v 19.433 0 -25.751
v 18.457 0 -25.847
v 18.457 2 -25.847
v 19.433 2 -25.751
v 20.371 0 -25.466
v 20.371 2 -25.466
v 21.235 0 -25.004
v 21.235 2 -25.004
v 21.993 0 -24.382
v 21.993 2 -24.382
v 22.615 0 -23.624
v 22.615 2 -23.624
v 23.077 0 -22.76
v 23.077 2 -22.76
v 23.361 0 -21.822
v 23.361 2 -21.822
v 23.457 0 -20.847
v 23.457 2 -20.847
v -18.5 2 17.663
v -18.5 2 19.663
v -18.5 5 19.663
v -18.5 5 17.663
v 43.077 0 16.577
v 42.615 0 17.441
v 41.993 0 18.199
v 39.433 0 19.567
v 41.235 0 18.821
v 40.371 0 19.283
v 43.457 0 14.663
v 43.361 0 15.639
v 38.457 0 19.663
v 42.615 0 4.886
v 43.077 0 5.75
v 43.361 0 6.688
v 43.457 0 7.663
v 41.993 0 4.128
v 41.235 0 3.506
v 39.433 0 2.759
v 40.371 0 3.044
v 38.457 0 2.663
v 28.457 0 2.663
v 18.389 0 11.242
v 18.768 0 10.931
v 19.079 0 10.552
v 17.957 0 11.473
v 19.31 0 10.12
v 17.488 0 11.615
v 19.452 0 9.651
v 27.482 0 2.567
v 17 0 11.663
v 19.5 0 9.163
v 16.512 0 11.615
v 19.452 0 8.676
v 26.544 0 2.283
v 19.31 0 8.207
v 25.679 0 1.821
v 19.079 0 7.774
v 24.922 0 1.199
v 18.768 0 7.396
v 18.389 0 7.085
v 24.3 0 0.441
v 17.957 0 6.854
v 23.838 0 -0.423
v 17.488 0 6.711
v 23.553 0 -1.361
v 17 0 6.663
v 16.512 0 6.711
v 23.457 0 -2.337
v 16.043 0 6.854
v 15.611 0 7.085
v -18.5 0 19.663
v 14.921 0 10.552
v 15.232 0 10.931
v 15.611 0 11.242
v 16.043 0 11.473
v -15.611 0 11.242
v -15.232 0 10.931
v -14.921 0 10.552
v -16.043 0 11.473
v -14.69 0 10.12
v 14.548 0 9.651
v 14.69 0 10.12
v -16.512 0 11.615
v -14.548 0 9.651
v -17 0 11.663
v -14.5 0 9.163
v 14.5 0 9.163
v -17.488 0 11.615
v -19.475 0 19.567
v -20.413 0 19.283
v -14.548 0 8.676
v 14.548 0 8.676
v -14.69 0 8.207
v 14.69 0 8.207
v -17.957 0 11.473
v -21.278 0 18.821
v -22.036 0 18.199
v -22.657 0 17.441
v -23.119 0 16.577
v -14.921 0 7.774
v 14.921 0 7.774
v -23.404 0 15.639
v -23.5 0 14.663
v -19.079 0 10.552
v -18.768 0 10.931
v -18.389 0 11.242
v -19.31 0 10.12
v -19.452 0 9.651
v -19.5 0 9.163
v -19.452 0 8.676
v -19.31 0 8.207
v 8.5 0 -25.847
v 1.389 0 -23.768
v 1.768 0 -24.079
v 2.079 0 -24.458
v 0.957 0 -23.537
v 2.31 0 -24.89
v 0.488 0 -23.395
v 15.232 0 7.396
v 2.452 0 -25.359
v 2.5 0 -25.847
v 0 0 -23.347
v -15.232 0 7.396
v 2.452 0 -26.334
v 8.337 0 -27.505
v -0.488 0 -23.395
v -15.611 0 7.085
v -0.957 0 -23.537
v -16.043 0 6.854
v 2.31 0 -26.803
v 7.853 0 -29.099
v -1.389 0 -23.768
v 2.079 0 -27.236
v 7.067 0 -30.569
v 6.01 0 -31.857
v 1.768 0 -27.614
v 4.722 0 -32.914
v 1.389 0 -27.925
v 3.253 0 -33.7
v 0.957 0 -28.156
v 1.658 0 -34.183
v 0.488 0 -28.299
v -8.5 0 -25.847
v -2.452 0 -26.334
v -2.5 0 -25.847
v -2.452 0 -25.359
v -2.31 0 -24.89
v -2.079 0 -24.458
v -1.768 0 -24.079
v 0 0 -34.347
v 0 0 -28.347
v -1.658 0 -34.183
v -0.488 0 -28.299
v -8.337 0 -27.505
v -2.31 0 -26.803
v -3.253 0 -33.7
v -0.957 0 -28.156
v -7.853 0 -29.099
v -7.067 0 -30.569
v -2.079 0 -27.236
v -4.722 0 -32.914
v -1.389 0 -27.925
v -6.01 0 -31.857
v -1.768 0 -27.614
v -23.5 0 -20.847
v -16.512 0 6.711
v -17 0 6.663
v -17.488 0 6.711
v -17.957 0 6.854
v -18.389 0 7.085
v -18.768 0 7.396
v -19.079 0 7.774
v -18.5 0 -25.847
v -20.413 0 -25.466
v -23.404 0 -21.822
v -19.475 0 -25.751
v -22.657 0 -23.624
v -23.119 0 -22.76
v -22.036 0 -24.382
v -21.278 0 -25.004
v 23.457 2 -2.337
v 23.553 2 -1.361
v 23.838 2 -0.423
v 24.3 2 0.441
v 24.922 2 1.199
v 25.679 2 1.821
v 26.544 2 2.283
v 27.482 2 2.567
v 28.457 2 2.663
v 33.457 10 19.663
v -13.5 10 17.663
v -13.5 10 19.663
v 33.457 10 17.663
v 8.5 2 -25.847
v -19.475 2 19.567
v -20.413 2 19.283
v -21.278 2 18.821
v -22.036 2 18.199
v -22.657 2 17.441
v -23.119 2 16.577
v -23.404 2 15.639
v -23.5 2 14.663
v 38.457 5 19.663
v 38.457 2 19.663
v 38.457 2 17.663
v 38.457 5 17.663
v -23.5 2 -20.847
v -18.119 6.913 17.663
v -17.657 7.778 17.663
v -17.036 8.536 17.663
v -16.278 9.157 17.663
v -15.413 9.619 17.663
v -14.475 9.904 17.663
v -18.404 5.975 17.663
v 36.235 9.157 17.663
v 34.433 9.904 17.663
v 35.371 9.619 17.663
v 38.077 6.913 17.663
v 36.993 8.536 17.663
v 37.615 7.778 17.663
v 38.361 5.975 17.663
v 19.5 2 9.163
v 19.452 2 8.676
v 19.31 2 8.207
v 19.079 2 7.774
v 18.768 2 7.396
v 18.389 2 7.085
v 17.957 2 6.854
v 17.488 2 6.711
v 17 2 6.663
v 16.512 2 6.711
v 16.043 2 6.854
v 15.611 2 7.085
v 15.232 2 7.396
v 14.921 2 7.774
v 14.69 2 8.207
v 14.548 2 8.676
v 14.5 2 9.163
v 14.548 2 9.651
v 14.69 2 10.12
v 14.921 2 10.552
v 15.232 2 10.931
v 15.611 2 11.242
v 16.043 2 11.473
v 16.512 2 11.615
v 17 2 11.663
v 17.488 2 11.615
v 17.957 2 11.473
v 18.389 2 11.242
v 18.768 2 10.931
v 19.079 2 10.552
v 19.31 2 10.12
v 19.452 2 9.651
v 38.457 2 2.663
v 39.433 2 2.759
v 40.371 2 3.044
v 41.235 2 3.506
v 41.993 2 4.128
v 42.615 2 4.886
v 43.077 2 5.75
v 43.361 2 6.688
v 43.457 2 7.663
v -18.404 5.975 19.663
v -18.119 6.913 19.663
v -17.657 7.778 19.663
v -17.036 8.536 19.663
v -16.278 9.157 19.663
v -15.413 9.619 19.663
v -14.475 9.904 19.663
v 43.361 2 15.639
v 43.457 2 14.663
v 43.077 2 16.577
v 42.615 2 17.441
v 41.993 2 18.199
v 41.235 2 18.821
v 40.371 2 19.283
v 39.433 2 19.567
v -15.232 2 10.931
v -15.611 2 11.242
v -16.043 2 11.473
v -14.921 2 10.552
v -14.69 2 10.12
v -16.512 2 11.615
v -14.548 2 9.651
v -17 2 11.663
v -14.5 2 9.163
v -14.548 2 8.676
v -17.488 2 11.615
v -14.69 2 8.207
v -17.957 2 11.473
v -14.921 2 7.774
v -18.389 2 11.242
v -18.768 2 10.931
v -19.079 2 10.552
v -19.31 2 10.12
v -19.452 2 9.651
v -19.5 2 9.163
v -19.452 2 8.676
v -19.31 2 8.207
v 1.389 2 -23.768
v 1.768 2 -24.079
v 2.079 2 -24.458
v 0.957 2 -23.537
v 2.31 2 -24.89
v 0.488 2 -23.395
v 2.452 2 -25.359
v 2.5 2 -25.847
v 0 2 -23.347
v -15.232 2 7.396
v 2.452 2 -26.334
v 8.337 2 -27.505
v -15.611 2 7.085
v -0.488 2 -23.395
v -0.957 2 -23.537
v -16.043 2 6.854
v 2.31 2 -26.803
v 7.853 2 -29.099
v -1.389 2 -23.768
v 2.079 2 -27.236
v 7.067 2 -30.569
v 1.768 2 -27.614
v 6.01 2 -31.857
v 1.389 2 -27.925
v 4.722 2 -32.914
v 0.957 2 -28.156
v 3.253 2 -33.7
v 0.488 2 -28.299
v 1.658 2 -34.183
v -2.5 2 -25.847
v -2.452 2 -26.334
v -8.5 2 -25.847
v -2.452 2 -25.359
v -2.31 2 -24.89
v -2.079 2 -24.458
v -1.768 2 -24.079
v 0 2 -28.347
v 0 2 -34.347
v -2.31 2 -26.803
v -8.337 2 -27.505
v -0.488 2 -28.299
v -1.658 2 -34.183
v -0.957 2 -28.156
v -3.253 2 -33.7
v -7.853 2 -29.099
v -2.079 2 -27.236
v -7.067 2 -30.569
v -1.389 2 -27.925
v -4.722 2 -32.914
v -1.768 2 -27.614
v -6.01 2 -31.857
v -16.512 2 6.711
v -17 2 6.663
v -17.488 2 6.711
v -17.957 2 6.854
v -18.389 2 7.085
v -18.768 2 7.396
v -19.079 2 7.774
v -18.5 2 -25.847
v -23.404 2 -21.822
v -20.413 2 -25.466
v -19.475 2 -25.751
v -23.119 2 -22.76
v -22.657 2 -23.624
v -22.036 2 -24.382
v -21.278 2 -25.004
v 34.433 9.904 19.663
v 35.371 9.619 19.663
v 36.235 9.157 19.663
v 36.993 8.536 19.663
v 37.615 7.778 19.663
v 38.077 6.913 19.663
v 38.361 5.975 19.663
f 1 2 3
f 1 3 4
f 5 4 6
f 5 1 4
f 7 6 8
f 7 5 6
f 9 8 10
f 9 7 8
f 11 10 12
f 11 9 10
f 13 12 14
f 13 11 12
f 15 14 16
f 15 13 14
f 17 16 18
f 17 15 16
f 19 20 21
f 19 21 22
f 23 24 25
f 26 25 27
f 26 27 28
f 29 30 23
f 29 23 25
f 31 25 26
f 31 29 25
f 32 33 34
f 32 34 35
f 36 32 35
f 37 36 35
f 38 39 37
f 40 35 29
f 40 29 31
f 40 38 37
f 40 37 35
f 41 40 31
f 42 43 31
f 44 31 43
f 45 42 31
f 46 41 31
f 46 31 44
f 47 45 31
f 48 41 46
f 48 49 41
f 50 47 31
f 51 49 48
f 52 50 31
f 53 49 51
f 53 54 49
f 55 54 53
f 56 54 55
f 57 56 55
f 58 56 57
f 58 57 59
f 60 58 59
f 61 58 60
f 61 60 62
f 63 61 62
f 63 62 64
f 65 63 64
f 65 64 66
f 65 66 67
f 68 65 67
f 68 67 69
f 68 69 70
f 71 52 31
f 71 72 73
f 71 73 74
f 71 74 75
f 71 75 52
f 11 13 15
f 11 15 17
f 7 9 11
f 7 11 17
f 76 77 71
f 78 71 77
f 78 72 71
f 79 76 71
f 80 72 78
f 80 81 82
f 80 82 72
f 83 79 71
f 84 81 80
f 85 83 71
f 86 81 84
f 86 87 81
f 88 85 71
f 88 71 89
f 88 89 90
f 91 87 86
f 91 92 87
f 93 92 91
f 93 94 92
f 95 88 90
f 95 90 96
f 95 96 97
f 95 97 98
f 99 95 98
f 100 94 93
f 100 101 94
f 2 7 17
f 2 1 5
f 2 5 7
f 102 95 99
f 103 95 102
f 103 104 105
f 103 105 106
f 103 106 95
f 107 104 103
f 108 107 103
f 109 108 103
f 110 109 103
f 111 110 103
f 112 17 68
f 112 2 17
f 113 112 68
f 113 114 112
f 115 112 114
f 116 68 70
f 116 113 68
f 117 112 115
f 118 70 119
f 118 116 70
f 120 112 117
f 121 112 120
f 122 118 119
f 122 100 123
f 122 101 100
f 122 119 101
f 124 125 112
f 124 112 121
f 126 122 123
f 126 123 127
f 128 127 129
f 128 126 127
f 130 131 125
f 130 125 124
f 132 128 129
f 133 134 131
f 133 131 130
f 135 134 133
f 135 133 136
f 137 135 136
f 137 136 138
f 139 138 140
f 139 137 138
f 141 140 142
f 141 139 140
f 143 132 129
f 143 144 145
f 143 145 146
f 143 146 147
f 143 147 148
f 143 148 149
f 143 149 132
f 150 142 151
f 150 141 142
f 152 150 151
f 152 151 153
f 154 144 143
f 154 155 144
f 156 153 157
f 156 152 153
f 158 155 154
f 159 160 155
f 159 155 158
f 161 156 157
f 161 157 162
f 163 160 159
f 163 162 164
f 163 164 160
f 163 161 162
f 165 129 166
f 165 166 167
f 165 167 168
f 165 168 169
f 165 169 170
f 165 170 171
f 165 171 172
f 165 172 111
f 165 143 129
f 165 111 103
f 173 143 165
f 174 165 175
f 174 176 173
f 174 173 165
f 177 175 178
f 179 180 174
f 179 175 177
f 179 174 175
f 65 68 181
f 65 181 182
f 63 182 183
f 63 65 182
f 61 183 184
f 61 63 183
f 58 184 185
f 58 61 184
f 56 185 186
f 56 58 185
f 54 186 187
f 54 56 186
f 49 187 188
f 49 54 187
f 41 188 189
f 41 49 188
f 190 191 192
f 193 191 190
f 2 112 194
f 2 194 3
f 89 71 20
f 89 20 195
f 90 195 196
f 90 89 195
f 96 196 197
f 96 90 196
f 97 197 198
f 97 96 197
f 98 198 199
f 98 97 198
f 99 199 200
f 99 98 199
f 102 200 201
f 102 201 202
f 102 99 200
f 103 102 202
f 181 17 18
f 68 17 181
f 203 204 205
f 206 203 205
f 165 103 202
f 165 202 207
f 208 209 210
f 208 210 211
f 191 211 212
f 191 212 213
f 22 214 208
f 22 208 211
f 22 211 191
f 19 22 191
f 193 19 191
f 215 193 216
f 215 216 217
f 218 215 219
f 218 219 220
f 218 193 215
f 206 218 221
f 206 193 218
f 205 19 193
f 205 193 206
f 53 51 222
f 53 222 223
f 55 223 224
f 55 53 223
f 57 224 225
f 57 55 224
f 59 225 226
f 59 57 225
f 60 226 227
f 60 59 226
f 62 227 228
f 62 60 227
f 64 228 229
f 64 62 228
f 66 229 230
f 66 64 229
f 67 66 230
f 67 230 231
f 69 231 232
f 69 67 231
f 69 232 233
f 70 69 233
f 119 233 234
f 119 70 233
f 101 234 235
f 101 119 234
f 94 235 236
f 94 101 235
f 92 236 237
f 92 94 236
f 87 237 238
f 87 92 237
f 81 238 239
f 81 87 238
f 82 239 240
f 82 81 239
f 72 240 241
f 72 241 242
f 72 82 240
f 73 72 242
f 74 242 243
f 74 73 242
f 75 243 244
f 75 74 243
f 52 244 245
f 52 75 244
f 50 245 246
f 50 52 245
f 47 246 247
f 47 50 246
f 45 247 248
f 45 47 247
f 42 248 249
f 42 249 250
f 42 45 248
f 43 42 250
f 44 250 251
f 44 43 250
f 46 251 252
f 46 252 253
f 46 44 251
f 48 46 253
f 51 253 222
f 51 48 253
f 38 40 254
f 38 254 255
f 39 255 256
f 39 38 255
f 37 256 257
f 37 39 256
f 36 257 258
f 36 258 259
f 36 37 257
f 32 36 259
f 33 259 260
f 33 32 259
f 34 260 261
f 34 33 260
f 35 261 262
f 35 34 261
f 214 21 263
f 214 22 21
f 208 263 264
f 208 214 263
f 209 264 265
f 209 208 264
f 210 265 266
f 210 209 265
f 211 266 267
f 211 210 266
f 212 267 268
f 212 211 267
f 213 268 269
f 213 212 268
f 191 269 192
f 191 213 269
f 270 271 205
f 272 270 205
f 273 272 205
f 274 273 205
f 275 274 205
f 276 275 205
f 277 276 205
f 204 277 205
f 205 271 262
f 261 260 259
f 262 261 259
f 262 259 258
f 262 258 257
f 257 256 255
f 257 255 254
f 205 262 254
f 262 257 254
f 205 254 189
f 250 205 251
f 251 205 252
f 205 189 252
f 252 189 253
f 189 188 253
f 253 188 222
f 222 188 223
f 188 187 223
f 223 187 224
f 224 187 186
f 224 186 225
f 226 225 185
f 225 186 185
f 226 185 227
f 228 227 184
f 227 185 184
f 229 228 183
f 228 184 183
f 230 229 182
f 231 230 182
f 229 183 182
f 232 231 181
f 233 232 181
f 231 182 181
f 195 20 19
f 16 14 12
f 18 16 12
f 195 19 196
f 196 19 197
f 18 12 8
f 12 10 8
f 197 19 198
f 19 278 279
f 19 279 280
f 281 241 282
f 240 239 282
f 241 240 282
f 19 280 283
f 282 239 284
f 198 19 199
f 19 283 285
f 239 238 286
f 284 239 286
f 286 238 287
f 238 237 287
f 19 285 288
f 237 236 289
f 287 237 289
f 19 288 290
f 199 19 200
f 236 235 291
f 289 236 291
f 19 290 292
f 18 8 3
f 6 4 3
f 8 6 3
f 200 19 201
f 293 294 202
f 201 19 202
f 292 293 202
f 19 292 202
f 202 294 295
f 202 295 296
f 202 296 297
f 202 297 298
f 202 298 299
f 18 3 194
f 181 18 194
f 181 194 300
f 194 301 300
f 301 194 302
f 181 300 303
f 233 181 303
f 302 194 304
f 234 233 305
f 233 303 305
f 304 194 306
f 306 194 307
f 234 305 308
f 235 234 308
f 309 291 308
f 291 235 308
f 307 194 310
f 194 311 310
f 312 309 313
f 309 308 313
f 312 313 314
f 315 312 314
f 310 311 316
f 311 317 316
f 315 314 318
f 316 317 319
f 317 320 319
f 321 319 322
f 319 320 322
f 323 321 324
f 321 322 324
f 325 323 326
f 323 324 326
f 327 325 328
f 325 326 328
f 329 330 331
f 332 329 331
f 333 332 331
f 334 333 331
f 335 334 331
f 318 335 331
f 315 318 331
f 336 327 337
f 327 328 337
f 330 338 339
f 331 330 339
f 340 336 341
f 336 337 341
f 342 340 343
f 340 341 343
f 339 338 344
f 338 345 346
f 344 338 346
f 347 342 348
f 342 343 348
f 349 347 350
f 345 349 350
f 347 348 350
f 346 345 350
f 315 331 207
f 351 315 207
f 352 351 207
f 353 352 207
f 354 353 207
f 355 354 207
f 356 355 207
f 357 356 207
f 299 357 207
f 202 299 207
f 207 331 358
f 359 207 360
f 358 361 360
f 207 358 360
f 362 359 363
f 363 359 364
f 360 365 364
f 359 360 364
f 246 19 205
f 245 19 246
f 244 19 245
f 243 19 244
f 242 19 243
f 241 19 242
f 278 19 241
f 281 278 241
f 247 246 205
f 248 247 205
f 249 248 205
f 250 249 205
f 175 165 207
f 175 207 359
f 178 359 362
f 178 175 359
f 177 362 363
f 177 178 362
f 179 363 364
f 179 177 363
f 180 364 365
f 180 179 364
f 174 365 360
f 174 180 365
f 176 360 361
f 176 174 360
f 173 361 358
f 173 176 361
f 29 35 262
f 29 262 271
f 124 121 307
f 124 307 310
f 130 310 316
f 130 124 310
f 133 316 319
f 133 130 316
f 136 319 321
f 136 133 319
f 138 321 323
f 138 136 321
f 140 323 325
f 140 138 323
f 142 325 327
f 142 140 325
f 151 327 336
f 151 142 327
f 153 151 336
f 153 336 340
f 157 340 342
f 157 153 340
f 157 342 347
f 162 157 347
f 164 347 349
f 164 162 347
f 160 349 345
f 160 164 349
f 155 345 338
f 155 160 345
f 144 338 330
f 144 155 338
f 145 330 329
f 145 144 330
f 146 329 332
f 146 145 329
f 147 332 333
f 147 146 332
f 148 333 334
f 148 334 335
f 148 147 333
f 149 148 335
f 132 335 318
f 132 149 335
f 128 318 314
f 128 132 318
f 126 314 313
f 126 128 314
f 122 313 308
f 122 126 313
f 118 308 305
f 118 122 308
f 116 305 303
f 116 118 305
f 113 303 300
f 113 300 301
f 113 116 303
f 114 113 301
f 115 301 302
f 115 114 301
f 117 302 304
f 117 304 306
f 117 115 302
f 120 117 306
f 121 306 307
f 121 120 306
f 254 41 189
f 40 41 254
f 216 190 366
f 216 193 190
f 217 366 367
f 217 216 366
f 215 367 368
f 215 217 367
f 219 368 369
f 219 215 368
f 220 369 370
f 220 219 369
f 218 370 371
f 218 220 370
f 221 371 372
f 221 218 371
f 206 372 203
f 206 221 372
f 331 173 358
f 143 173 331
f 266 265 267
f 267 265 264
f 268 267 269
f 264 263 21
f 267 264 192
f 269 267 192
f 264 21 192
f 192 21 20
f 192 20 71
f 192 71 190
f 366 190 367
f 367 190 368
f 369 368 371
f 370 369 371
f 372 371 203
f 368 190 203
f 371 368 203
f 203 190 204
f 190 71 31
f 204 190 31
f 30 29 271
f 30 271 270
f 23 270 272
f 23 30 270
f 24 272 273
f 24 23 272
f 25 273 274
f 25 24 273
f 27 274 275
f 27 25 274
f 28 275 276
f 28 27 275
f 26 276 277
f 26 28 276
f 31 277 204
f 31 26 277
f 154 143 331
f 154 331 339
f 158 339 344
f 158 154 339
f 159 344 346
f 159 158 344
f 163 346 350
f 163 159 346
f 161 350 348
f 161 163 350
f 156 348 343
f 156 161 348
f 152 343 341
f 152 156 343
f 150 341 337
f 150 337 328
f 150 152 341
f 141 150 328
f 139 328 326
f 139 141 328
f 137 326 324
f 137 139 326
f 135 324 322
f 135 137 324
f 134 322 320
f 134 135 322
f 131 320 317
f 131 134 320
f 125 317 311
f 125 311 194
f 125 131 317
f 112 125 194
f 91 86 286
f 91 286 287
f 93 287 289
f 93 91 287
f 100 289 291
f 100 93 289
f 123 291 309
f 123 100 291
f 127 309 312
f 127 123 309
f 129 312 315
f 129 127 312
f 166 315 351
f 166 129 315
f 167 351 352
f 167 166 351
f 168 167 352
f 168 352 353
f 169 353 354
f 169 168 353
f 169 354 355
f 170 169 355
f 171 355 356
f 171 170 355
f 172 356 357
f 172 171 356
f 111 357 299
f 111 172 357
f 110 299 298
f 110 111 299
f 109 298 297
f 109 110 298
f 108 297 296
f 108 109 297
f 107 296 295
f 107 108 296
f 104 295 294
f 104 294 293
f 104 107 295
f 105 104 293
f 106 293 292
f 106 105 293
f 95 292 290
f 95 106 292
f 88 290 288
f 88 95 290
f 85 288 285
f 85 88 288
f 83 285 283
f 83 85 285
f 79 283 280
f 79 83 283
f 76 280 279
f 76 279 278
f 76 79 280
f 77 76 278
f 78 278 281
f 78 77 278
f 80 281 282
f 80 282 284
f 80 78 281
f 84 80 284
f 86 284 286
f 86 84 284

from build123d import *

# Parameters (mm, degrees)
SKETCH1_R           = 2.5
BOSS_EXTRUDE1_DEPTH = 2
SKETCH2_W           = 56.957260919
SKETCH2_H           = 2
BOSS_EXTRUDE2_DEPTH = 8
FILLET1_R           = 5


with BuildPart() as part:
    # Sketch1 → Boss-Extrude1 (new body)
    with BuildSketch(Plane(origin=(0, 0, 0), x_dir=(1, 0, 0), z_dir=(0, 1, 0))):
        with BuildLine():
            Line((-18.5, 25.846586538), (-8.5, 25.846586538))
            ThreePointArc((-8.5, 25.846586538), (0, 34.346586538), (8.5, 25.846586538))
            Line((8.5, 25.846586538), (18.457260919, 25.846586538))
            ThreePointArc((18.457260919, 25.846586538), (21.992794825, 24.382120444), (23.457260919, 20.846586538))
            Line((23.457260919, 20.846586538), (23.457260919, 2.336586538))
            ThreePointArc((23.457260919, 2.336586538), (24.921727013, -1.198947367), (28.457260919, -2.663413462))
            Line((28.457260919, -2.663413462), (38.457260919, -2.663413462))
            ThreePointArc((38.457260919, -2.663413462), (41.992794825, -4.127879556), (43.457260919, -7.663413462))
            Line((43.457260919, -7.663413462), (43.457260919, -14.663413462))
            ThreePointArc((43.457260919, -14.663413462), (41.992794825, -18.198947367), (38.457260919, -19.663413462))
            Line((38.457260919, -19.663413462), (23.457260919, -19.663413462))
            Line((23.457260919, -19.663413462), (0, -19.663413462))
            Line((0, -19.663413462), (-18.5, -19.663413462))
            ThreePointArc((-18.5, -19.663413462), (-22.035533906, -18.198947367), (-23.5, -14.663413462))
            Line((-23.5, -14.663413462), (-23.5, 20.846586538))
            ThreePointArc((-23.5, 20.846586538), (-22.035533906, 24.382120444), (-18.5, 25.846586538))
        make_face()
        with Locations((-17, -9.163413462)):
            Circle(SKETCH1_R, mode=Mode.SUBTRACT)
        with Locations((17, -9.163413462)):
            Circle(SKETCH1_R, mode=Mode.SUBTRACT)
        with Locations((0, 25.846586538)):
            Circle(SKETCH1_R, mode=Mode.SUBTRACT)
    extrude(amount=BOSS_EXTRUDE1_DEPTH)

    # Sketch2 → Boss-Extrude2 (add)
    with BuildSketch(Plane(origin=(0, 2, 0), x_dir=(1, 0, 0), z_dir=(0, 1, 0))):
        with Locations((9.978630459, -18.663413462)):
            Rectangle(SKETCH2_W, SKETCH2_H)
    extrude(amount=BOSS_EXTRUDE2_DEPTH)

    # Fillet1
    fillet1_edges = [part.edges().sort_by_distance(p)[0] for p in [
        (-18.5, 10, 18.663413462),
        (38.457260919, 10, 18.663413462),
    ]]
    fillet(fillet1_edges, radius=FILLET1_R)


solid = part.part
